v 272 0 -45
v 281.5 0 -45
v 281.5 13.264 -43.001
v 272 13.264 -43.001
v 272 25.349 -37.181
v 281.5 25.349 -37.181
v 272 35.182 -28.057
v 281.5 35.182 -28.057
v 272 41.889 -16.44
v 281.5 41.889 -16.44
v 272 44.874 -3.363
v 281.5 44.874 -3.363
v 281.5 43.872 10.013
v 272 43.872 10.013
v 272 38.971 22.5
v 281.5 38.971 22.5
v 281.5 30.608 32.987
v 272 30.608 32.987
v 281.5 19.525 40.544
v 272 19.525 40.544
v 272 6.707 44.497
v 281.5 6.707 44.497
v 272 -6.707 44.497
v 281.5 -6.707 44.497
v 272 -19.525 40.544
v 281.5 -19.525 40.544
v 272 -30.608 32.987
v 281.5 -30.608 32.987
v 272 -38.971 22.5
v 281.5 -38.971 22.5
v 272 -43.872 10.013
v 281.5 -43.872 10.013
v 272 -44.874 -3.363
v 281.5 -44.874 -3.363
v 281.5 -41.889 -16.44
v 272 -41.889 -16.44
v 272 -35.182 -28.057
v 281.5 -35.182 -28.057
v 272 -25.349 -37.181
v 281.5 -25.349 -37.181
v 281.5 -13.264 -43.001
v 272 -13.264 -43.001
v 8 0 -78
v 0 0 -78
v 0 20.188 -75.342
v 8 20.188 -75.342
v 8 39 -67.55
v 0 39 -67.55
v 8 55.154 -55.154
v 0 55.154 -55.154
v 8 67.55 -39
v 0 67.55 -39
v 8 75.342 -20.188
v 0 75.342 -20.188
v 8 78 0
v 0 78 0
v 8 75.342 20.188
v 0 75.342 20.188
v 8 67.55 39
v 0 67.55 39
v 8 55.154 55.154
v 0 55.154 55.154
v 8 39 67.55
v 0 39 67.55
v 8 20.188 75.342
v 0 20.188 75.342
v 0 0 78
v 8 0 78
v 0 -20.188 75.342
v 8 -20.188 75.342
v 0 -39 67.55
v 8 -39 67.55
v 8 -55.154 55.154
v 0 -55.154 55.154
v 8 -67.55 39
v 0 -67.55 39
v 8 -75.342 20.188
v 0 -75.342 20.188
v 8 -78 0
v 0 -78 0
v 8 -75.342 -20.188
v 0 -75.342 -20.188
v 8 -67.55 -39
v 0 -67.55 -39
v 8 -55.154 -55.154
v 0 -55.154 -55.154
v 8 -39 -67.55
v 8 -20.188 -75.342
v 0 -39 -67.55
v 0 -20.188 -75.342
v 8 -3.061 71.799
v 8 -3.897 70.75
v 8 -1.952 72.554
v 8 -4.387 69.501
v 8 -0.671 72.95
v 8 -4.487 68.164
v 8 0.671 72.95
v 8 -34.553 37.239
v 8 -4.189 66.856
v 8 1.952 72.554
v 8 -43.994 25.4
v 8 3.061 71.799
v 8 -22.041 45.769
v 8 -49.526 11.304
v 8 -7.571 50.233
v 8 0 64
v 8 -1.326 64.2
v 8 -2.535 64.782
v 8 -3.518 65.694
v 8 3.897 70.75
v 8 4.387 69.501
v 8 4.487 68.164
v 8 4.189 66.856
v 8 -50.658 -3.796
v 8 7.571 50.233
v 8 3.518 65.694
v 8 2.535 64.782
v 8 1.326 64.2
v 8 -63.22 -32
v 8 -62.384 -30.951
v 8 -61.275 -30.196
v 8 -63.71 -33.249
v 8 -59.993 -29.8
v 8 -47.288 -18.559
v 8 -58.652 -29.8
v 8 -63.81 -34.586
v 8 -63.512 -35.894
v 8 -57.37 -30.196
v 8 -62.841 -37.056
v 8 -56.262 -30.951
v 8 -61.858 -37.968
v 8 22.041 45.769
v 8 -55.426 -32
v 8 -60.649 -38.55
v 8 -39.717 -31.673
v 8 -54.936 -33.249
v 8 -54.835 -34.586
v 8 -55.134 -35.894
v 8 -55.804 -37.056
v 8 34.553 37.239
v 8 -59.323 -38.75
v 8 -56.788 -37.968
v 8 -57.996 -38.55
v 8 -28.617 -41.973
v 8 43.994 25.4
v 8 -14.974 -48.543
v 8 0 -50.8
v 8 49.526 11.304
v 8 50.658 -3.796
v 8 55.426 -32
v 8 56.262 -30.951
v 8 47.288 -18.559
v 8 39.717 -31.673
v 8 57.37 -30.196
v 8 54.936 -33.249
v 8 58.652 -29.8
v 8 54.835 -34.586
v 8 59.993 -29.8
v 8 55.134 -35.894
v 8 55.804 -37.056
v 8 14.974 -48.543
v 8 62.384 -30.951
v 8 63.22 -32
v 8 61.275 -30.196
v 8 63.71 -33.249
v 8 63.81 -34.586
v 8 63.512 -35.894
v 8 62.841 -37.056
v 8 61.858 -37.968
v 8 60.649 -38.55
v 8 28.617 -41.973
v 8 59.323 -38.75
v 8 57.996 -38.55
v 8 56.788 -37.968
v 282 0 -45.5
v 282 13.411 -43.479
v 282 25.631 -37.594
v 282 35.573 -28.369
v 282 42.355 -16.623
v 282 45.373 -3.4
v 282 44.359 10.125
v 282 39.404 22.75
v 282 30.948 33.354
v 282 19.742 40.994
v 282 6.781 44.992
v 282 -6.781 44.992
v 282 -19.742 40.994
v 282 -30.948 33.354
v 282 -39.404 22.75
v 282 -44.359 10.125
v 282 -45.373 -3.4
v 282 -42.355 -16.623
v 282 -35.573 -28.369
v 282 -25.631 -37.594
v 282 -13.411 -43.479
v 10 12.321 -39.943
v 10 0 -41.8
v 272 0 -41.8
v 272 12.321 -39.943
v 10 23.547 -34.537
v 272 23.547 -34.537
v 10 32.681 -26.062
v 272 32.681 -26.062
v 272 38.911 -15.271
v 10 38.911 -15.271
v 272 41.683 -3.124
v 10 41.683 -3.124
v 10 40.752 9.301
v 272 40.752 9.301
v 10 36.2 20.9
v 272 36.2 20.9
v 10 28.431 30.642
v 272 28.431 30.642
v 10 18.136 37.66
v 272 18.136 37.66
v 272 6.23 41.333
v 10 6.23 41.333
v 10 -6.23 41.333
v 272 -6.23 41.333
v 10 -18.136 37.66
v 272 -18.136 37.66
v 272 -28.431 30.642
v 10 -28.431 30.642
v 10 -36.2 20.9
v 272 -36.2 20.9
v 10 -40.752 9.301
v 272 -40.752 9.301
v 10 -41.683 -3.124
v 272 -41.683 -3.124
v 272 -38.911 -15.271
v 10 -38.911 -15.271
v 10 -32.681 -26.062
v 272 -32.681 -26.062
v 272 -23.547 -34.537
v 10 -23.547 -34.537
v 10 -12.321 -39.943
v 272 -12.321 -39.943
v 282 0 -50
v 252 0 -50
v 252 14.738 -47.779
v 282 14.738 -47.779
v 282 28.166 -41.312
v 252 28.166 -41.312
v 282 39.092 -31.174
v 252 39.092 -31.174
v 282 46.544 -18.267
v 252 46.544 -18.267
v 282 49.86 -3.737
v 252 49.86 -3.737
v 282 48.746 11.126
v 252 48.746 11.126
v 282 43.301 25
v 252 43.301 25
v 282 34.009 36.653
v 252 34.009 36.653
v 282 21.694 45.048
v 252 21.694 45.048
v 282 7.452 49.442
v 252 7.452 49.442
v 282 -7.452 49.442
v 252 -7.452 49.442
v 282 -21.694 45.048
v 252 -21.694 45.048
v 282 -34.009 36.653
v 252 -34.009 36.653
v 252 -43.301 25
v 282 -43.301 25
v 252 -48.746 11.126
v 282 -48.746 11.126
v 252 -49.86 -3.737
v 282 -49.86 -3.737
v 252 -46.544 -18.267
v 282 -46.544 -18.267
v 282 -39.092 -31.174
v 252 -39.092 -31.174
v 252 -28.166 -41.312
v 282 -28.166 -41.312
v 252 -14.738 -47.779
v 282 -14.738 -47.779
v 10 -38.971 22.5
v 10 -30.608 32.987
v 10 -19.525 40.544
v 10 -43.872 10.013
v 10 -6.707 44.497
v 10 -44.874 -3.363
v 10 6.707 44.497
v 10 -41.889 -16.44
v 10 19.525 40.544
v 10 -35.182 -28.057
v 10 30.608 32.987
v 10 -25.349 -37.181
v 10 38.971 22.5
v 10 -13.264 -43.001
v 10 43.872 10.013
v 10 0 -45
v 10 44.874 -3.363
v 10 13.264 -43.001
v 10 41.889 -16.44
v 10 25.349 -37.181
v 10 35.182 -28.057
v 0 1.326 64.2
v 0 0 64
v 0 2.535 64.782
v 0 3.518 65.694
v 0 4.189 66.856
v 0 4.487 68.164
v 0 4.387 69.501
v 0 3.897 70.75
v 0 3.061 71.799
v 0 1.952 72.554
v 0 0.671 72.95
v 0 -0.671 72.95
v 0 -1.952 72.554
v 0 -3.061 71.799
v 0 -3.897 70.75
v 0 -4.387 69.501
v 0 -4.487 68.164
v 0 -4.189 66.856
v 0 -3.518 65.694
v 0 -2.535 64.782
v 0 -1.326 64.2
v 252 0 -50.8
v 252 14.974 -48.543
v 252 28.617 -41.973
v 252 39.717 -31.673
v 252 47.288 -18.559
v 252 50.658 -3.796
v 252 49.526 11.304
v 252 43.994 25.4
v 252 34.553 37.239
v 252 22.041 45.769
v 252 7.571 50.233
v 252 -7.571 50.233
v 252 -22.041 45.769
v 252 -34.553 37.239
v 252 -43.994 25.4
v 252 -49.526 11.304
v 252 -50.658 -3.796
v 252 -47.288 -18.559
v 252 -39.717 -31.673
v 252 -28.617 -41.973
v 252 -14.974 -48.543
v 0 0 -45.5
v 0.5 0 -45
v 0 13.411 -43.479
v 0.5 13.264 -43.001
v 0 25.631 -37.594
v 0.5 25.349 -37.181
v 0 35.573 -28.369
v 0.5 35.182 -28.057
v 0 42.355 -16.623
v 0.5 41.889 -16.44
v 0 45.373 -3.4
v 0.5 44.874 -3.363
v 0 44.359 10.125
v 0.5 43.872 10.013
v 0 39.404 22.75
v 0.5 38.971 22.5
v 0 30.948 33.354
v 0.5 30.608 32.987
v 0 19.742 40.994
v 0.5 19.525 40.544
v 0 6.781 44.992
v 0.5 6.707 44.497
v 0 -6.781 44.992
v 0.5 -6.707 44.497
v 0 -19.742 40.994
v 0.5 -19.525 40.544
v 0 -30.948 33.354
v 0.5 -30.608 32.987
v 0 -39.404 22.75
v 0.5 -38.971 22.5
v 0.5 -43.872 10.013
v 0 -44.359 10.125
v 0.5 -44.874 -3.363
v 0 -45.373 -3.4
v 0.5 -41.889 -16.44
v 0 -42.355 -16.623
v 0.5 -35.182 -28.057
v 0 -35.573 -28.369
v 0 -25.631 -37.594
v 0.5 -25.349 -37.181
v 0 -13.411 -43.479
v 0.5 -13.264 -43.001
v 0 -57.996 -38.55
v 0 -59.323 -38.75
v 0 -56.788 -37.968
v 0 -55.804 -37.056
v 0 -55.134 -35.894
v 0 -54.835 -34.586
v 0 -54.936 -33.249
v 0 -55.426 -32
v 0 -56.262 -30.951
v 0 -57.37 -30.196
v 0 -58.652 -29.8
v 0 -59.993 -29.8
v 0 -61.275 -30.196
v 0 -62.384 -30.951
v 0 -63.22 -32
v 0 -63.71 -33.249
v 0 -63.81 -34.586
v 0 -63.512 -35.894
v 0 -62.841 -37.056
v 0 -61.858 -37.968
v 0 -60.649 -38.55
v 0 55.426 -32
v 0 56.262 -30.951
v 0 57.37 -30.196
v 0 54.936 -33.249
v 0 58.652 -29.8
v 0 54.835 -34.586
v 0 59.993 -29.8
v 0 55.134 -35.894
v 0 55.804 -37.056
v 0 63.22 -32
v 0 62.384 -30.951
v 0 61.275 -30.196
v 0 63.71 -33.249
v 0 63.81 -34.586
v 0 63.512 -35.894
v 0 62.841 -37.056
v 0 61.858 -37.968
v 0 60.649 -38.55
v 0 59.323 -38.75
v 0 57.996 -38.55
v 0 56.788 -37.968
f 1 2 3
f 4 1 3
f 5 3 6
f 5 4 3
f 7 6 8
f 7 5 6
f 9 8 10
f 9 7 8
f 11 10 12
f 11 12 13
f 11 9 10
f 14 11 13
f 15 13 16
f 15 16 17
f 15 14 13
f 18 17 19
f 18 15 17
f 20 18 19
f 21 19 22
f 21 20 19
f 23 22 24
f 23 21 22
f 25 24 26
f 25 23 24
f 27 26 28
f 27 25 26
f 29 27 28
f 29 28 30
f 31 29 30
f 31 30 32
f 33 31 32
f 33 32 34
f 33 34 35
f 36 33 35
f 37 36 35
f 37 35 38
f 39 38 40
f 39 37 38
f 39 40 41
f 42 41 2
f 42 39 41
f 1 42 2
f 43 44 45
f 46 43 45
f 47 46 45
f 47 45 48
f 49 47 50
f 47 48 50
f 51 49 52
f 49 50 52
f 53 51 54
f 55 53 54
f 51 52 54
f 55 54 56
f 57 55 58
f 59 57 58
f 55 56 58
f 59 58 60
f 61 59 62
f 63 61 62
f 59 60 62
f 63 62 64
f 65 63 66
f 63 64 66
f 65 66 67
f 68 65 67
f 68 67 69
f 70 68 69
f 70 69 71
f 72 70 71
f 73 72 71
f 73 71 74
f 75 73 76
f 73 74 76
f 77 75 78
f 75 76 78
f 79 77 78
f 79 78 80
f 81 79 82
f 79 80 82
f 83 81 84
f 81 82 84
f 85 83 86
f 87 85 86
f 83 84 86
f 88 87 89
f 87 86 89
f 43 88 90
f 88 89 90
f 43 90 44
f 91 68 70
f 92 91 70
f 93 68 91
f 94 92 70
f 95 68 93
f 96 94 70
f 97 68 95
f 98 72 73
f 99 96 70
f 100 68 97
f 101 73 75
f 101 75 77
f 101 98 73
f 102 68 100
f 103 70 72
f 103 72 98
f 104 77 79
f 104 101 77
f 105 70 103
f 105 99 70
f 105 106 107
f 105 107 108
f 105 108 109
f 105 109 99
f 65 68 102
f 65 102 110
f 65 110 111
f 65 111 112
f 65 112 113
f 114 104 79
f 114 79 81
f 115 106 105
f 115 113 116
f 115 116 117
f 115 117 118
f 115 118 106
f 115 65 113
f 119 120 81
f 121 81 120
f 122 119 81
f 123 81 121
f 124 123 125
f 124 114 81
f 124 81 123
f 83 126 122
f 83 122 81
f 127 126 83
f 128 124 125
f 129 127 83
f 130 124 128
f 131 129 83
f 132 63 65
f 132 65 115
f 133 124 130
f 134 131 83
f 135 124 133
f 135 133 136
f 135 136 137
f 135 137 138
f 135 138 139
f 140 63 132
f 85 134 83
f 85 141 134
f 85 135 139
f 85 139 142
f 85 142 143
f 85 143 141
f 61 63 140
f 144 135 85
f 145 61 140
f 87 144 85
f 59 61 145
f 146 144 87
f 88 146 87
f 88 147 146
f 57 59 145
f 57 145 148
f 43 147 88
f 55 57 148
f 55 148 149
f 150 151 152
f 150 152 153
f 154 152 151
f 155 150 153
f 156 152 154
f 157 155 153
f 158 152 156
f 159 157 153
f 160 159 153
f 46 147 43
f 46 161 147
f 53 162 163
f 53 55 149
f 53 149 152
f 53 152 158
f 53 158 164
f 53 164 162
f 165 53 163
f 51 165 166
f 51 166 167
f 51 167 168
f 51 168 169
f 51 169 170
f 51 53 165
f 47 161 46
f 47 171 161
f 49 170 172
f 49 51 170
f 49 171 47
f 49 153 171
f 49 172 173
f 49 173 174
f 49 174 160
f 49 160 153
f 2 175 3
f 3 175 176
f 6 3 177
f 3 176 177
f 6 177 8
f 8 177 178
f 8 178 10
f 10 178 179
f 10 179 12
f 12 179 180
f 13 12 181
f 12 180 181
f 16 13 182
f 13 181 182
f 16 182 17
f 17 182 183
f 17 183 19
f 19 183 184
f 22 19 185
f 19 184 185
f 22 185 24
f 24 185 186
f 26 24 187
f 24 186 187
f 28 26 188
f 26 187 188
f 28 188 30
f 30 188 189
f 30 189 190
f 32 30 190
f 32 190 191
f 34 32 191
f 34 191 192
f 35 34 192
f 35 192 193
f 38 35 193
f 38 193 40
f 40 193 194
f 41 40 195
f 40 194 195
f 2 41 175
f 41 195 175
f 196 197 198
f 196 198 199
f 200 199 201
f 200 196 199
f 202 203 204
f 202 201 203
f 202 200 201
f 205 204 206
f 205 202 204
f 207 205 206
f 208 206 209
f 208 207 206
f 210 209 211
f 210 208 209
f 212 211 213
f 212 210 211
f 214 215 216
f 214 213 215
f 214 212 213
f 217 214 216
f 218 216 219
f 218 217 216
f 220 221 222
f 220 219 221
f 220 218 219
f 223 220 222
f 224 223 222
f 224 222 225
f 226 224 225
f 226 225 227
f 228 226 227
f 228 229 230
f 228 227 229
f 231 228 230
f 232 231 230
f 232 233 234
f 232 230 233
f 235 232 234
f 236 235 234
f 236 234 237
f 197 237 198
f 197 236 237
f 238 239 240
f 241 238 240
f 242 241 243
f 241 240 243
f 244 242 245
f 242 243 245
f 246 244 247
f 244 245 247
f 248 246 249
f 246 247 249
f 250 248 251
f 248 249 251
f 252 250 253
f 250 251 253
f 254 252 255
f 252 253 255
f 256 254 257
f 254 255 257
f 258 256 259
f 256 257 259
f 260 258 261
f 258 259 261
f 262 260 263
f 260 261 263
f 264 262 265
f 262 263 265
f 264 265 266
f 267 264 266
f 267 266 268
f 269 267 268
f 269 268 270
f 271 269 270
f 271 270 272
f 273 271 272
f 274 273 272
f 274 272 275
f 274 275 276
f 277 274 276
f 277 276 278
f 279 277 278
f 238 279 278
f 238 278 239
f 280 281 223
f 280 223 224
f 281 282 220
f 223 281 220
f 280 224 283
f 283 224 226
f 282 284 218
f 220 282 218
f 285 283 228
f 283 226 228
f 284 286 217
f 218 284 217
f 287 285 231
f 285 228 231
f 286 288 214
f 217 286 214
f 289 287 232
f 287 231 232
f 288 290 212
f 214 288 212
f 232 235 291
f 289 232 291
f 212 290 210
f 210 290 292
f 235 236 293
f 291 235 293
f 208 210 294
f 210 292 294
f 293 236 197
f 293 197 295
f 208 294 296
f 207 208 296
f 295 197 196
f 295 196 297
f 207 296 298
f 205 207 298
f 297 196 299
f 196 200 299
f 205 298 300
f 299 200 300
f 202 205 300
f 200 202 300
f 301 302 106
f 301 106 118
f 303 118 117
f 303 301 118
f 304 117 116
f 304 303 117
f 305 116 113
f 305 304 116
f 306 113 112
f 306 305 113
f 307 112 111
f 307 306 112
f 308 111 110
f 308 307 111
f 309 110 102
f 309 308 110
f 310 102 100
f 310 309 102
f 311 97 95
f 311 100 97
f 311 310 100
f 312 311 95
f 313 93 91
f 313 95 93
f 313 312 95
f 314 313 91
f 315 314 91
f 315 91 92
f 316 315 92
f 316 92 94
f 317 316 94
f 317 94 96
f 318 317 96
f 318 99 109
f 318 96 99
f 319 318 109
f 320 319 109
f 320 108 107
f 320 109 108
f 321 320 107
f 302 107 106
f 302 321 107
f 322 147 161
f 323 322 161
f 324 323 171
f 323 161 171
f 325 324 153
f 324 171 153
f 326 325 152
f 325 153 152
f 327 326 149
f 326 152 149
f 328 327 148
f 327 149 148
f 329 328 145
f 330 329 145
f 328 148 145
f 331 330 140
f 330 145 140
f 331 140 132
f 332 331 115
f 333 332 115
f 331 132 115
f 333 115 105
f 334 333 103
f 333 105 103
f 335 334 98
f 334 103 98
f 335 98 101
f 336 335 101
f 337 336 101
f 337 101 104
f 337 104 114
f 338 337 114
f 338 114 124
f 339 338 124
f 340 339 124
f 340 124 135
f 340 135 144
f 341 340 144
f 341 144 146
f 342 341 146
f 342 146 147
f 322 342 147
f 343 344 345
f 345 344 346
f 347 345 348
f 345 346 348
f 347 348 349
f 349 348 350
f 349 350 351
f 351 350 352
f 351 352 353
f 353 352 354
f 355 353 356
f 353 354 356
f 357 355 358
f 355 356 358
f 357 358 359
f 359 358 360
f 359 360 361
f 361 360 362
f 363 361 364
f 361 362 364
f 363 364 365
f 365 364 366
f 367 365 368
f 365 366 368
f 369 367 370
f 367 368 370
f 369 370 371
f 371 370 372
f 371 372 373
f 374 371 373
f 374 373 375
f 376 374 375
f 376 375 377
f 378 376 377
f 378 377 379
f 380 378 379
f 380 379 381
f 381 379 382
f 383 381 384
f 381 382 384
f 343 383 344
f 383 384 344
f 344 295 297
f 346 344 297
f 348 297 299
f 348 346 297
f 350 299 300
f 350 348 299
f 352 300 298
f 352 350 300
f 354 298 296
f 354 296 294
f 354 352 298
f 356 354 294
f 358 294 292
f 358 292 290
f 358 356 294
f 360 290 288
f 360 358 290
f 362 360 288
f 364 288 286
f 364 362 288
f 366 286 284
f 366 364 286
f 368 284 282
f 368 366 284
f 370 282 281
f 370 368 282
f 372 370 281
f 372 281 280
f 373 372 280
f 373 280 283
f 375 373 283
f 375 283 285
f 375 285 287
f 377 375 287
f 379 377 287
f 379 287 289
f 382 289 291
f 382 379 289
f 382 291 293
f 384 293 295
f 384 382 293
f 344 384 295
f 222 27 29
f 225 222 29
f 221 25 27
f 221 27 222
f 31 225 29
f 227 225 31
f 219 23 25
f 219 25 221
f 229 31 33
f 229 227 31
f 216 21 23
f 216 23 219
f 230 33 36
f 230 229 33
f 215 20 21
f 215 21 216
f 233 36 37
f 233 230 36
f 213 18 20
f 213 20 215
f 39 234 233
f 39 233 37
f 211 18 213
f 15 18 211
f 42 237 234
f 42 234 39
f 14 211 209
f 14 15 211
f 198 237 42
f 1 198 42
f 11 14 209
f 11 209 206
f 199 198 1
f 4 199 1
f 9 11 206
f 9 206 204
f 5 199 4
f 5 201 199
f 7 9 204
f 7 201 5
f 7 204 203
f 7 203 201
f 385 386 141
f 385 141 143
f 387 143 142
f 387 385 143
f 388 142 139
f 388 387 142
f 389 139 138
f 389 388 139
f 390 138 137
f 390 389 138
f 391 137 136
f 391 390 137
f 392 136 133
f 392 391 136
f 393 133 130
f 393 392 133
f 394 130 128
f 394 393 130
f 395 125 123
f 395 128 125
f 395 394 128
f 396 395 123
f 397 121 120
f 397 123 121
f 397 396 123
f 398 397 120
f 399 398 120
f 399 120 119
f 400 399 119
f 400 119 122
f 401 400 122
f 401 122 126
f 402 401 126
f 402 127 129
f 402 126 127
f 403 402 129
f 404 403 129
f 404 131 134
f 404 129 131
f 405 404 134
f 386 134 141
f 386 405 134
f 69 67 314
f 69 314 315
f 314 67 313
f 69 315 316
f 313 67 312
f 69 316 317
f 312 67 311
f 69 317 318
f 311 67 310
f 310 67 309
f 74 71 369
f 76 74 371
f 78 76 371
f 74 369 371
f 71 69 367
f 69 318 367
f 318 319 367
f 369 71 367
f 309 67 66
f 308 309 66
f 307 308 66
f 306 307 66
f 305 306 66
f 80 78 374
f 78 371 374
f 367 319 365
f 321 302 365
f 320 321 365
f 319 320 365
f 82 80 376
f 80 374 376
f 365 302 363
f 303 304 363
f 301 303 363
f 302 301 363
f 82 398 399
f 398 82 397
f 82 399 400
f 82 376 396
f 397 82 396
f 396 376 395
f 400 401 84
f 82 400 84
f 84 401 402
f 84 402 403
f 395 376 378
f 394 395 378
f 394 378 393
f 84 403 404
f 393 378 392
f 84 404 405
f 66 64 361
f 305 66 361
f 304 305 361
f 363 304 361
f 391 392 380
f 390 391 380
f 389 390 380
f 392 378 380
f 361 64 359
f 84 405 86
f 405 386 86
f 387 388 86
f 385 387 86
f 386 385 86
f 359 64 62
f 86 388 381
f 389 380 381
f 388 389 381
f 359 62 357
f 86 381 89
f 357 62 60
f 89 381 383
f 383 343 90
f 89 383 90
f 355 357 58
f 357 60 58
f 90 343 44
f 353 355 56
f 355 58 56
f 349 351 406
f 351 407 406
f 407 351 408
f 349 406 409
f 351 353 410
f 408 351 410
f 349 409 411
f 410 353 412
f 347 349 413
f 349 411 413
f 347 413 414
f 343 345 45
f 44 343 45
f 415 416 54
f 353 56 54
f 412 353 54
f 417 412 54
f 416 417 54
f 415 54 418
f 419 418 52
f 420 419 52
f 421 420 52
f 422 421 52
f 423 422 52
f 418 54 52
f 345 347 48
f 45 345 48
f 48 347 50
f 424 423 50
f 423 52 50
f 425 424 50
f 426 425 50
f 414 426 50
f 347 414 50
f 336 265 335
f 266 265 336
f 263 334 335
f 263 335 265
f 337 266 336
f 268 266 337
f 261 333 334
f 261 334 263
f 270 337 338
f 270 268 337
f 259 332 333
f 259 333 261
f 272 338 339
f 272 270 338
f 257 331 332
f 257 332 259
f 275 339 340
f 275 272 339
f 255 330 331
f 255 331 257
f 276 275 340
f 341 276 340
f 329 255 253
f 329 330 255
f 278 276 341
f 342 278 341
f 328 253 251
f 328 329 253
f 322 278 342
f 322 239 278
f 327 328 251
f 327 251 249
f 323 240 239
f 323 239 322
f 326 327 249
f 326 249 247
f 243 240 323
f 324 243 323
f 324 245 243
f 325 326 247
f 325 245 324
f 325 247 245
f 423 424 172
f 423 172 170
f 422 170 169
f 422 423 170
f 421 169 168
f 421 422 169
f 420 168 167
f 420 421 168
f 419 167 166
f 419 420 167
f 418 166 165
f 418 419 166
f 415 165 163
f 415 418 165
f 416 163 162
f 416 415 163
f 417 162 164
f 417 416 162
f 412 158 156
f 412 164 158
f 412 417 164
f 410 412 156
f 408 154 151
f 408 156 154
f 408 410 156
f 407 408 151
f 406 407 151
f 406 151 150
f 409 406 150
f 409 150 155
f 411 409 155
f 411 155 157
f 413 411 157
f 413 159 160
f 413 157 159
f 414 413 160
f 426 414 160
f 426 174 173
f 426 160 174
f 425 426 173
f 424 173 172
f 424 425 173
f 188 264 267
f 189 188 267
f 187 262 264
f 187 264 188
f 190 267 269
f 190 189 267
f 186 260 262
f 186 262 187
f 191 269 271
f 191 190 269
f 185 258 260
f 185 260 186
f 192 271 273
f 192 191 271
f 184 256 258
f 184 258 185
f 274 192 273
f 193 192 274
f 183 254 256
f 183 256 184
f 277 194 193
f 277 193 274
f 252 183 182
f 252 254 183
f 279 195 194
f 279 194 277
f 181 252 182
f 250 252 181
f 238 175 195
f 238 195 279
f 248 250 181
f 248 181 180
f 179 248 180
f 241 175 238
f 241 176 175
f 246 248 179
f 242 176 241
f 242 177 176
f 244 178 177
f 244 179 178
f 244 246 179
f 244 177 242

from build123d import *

# Parameters (mm, degrees)
SKETCH_1_R               = 78
EXTRUDE_1_DEPTH          = 8
SKETCH_2_R               = 50.8
EXTRUDE_2_DEPTH          = 252
SKETCH_3_R               = 50
EXTRUDE_3_DEPTH          = 282
CUT_EXTRUDE_1_DEPTH      = 303.806869143
CUT_EXTRUDE_1_DEPTH_BACK = 303.806869143
SKETCH_4_R               = 41.8
SKETCH_6_R               = 45
CUT_EXTRUDE_3_DEPTH      = 10
CUT_EXTRUDE_START        = -10
SKETCH_7_R               = 45
CUT_EXTRUDE_4_DEPTH      = 10
CUT_EXTRUDE_5_DEPTH      = 303.806869143
CUT_EXTRUDE_5_DEPTH_BACK = 303.806869143
SKETCH_8_R               = 4.5
CHAMFER_1_SIZE           = 0.5
CHAMFER_2_SIZE           = 0.5


with BuildPart() as part:
    # ｽｹｯﾁ1 → ﾎﾞｽ - 押し出し1 (new body)
    with BuildSketch(Plane(origin=(0, 0, 0), x_dir=(0, 0, -1), z_dir=(1, 0, 0))):
        Circle(SKETCH_1_R)
    extrude(amount=EXTRUDE_1_DEPTH)

    # ｽｹｯﾁ2 → ﾎﾞｽ - 押し出し2 (add)
    with BuildSketch(Plane(origin=(0, 0, 0), x_dir=(0, 0, -1), z_dir=(1, 0, 0))):
        Circle(SKETCH_2_R)
    extrude(amount=EXTRUDE_2_DEPTH)

    # ｽｹｯﾁ3 → ﾎﾞｽ - 押し出し3 (add)
    with BuildSketch(Plane(origin=(0, 0, 0), x_dir=(0, 0, -1), z_dir=(1, 0, 0))):
        Circle(SKETCH_3_R)
    extrude(amount=EXTRUDE_3_DEPTH)

    # ｽｹｯﾁ4 → ｶｯﾄ - 押し出し1 (cut, two sides: drawn at the far end of the back side and taken through both)
    with BuildSketch(Plane(origin=(0, 0, 0), x_dir=(0, 0, -1), z_dir=(1, 0, 0)).offset(-CUT_EXTRUDE_1_DEPTH_BACK)):
        Circle(SKETCH_4_R)
    extrude(amount=CUT_EXTRUDE_1_DEPTH + CUT_EXTRUDE_1_DEPTH_BACK, mode=Mode.SUBTRACT)

    # ｽｹｯﾁ6 → ｶｯﾄ - 押し出し3 (cut)
    with BuildSketch(Plane(origin=(0, 0, 0), x_dir=(0, 0, -1), z_dir=(1, 0, 0))):
        Circle(SKETCH_6_R)
    extrude(amount=CUT_EXTRUDE_3_DEPTH, mode=Mode.SUBTRACT)

    # ｽｹｯﾁ7 → ｶｯﾄ - 押し出し4 (cut)
    with BuildSketch(Plane(origin=(282, 0, 0), x_dir=(0, 0, -1), z_dir=(1, 0, 0)).offset(CUT_EXTRUDE_START)):
        Circle(SKETCH_7_R)
    extrude(amount=CUT_EXTRUDE_4_DEPTH, mode=Mode.SUBTRACT)

    # ｽｹｯﾁ8 → ｶｯﾄ - 押し出し5 (cut, two sides: drawn at the far end of the back side and taken through both)
    with BuildSketch(Plane(origin=(0, 0, 0), x_dir=(0, 0, -1), z_dir=(1, 0, 0)).offset(-CUT_EXTRUDE_5_DEPTH_BACK)):
        with Locations((-68.5, 0)):
            Circle(SKETCH_8_R)
        with Locations((34.25, 59.322740159)):
            Circle(SKETCH_8_R)
        with Locations((34.25, -59.322740159)):
            Circle(SKETCH_8_R)
    extrude(amount=CUT_EXTRUDE_5_DEPTH + CUT_EXTRUDE_5_DEPTH_BACK, mode=Mode.SUBTRACT)

    # 面取り1
    chamfer_1_edges = [part.edges().sort_by_distance(p)[0] for p in [
        (0, 0, 45),
    ]]
    chamfer(chamfer_1_edges, length=CHAMFER_1_SIZE)

    # 面取り2
    chamfer_2_edges = [part.edges().sort_by_distance(p)[0] for p in [
        (282, 0, 45),
    ]]
    chamfer(chamfer_2_edges, length=CHAMFER_2_SIZE)


solid = part.part
